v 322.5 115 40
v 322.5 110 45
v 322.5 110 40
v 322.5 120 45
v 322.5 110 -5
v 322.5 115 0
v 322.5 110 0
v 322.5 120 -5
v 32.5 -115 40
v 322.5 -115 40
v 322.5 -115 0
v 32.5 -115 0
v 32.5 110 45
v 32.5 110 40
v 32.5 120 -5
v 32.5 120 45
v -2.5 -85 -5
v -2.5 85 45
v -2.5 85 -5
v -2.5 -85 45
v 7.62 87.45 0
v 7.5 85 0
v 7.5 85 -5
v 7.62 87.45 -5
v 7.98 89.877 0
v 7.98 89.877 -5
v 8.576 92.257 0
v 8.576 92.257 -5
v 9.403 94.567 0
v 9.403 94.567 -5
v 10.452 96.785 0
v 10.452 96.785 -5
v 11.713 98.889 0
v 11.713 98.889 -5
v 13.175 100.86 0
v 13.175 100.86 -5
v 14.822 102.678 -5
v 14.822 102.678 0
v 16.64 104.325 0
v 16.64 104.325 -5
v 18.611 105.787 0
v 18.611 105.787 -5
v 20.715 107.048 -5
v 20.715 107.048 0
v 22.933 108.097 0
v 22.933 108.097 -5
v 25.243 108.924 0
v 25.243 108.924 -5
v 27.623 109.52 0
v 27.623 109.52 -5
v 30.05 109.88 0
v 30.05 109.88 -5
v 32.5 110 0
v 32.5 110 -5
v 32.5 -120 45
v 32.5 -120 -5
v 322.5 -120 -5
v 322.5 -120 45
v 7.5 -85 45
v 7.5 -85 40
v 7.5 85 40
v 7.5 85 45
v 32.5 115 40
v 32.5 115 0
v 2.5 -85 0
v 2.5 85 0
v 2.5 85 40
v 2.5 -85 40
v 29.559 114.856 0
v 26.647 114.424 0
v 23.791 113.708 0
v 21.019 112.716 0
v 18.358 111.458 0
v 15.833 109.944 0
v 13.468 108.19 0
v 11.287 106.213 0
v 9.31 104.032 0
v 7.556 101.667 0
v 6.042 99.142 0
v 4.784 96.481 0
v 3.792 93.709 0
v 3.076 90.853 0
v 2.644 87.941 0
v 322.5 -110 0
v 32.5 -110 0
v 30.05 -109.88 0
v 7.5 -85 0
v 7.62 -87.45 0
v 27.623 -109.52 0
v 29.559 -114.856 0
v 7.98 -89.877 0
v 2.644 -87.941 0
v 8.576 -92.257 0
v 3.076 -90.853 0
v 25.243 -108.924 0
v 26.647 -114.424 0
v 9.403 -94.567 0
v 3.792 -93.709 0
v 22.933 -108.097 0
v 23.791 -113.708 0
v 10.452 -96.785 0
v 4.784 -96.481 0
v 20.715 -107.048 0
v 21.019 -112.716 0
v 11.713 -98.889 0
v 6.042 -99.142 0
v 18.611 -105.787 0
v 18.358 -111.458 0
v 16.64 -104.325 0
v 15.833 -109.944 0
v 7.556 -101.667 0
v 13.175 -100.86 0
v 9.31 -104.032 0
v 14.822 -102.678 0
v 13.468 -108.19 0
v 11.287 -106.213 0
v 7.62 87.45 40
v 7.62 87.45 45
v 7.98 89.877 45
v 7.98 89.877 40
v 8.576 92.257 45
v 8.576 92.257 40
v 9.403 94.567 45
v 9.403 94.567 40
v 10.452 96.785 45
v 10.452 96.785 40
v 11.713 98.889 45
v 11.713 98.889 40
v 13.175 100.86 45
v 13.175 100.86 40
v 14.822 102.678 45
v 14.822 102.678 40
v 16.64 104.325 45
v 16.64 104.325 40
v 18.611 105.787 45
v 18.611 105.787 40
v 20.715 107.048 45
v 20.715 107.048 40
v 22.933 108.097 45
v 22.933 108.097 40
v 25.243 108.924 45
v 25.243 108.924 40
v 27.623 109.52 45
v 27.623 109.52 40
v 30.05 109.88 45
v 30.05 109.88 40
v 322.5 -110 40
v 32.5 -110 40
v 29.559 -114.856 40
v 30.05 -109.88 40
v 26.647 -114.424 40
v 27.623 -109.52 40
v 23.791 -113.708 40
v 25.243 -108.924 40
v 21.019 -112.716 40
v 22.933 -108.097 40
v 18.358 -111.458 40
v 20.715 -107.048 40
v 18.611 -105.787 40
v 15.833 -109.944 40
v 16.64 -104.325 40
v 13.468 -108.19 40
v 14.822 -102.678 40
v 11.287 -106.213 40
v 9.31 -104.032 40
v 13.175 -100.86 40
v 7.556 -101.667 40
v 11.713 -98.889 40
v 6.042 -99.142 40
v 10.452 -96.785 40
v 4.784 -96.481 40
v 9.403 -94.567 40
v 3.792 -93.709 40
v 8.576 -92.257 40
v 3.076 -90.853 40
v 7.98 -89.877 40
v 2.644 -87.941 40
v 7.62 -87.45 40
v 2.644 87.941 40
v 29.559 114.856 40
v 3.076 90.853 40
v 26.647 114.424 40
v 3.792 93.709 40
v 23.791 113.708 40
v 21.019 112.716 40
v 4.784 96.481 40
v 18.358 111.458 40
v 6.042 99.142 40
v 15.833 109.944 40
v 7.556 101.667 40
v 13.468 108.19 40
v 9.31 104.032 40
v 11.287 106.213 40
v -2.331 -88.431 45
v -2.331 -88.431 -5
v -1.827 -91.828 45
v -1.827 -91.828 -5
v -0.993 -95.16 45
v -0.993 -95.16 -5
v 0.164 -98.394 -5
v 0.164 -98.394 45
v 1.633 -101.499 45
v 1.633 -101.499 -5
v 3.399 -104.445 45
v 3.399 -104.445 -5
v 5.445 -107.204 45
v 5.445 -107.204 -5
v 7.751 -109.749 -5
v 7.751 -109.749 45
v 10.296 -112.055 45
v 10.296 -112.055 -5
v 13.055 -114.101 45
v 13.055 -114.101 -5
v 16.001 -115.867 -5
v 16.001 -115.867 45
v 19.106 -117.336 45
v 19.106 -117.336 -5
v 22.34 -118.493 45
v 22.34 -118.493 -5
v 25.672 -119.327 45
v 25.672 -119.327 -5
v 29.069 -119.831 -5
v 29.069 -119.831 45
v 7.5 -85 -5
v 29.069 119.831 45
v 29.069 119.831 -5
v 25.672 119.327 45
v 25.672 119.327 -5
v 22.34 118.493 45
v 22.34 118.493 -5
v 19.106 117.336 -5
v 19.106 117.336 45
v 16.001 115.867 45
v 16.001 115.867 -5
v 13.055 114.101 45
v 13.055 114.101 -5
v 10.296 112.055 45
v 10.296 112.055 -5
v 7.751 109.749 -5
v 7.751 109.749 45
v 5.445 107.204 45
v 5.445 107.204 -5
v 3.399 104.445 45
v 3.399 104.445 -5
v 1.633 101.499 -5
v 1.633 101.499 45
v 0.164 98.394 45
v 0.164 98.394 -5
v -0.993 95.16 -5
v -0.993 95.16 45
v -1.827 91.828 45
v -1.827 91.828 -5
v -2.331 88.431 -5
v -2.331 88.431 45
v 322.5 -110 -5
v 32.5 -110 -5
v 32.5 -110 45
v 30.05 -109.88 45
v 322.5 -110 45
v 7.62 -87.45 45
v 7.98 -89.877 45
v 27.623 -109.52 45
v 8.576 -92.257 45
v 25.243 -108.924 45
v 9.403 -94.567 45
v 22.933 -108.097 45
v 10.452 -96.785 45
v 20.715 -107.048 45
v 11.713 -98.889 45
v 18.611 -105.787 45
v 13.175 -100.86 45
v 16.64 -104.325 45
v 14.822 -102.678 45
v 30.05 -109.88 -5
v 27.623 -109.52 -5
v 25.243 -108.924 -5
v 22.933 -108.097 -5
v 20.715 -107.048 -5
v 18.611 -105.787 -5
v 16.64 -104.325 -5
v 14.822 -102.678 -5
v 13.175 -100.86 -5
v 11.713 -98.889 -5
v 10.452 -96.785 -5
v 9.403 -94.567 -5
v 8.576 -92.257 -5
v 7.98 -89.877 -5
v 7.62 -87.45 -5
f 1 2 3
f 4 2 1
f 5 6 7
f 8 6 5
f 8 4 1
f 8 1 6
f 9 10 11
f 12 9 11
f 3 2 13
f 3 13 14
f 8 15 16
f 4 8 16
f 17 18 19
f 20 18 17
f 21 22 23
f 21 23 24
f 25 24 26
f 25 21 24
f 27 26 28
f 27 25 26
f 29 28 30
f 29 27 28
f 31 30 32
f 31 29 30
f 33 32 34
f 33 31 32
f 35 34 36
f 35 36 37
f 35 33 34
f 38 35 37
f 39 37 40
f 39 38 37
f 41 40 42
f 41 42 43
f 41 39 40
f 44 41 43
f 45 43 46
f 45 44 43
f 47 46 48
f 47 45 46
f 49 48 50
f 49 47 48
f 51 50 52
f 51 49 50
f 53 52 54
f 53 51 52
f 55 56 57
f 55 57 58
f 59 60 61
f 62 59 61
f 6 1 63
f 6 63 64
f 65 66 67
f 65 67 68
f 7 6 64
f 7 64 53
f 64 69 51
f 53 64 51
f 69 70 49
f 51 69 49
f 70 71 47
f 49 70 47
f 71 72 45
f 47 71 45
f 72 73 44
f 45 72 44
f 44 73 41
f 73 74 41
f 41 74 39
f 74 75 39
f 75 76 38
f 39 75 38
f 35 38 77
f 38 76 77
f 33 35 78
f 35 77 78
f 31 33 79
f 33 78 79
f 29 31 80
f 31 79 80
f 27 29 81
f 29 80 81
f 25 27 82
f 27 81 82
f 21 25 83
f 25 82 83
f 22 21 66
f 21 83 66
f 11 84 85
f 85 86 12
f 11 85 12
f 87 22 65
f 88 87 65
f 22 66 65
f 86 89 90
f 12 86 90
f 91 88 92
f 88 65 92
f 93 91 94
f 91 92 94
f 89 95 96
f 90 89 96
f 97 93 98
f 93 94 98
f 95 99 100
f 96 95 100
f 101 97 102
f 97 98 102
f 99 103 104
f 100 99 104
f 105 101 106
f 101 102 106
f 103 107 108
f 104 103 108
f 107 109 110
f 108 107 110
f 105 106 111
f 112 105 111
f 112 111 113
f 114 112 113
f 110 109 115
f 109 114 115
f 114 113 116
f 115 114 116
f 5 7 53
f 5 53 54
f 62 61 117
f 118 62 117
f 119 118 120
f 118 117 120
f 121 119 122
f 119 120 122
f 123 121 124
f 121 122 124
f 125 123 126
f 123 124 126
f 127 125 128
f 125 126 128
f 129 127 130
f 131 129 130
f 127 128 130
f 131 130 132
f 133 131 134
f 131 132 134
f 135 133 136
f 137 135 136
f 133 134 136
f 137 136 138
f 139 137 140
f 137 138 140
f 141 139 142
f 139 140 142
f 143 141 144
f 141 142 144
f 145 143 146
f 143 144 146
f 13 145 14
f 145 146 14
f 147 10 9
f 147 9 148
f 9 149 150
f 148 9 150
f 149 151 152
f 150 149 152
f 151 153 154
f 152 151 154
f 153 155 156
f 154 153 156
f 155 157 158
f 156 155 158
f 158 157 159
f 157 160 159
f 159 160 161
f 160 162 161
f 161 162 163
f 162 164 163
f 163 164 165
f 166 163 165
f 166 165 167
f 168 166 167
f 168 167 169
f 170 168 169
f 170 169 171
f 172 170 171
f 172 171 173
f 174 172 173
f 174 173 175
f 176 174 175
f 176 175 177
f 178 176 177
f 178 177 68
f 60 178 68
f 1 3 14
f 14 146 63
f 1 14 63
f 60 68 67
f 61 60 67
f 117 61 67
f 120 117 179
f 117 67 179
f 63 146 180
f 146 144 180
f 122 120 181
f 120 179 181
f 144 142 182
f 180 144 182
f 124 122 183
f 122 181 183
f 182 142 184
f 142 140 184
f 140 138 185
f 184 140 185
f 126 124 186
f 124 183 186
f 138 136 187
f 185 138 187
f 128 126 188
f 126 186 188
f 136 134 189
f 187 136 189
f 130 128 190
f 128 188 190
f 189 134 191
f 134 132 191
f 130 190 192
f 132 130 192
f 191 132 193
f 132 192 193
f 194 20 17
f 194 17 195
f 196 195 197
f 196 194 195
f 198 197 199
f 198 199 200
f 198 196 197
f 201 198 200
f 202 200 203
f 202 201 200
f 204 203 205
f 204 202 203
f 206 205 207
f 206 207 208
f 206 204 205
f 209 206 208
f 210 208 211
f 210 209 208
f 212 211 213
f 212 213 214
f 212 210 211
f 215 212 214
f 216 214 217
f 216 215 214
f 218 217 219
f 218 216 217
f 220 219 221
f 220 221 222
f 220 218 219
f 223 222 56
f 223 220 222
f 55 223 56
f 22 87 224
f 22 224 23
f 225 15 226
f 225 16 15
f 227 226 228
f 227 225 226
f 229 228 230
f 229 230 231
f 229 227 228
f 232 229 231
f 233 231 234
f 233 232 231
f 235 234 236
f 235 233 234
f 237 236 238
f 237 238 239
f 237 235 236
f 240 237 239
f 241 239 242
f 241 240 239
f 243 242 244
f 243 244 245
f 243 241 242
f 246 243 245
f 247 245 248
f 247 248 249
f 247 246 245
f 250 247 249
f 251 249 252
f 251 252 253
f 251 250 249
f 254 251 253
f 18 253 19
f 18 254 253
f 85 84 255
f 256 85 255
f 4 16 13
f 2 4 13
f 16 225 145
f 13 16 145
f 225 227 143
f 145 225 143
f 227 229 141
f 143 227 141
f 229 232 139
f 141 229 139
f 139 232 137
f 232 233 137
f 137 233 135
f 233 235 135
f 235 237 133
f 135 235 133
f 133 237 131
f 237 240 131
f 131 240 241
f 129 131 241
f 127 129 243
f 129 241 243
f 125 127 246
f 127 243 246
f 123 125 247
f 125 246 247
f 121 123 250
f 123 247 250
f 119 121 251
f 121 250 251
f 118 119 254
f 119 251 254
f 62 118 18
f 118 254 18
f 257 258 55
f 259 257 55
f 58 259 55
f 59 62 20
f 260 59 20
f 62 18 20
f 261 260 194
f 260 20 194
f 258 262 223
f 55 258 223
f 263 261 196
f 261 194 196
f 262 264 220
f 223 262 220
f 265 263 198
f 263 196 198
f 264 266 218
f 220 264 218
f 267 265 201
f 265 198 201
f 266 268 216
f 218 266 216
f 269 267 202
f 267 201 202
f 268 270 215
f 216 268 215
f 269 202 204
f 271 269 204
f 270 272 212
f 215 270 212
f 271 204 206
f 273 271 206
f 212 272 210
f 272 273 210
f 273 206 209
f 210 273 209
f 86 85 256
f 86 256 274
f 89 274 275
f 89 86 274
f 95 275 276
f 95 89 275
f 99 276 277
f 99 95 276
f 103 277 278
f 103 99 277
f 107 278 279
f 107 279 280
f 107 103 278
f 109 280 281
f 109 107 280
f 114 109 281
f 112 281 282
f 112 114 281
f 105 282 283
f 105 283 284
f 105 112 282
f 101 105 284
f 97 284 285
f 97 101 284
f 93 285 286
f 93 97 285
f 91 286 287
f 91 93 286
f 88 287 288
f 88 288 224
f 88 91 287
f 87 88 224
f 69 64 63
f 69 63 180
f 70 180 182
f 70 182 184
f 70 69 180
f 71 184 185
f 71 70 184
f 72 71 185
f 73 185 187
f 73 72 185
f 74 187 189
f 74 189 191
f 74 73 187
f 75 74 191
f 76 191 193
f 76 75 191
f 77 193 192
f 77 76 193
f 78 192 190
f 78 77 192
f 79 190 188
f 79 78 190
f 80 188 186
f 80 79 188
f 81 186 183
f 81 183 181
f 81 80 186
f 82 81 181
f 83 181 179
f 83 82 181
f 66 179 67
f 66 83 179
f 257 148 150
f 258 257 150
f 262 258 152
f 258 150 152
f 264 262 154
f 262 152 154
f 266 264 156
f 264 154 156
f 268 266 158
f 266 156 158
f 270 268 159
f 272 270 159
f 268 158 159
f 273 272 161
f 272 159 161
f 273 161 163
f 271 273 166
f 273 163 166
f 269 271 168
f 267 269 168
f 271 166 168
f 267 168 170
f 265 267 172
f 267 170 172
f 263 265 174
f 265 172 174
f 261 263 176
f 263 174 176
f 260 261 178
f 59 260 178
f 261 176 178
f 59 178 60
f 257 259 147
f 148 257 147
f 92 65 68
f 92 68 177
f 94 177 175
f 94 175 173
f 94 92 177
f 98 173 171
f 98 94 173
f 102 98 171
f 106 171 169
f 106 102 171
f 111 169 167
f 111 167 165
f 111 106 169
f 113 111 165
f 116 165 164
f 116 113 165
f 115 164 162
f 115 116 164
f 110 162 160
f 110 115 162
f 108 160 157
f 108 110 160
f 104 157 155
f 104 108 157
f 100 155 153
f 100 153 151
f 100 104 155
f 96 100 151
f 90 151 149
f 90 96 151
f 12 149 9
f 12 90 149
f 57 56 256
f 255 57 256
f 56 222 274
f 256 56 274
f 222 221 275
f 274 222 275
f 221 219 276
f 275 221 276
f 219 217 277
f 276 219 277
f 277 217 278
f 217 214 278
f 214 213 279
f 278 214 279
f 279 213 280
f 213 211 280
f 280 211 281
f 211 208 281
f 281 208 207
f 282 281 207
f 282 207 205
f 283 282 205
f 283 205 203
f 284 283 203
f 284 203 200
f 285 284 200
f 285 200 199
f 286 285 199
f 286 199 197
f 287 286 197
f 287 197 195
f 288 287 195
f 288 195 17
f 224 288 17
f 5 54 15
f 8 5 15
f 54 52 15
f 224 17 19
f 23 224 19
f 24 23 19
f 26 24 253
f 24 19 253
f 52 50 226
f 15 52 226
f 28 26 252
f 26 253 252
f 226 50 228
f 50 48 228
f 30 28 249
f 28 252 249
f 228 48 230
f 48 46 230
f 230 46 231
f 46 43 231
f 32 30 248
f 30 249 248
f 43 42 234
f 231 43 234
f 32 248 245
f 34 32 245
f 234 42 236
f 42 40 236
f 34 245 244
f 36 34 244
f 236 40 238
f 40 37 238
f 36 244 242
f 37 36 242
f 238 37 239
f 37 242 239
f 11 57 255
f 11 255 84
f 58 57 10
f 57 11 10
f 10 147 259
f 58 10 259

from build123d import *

# Parameters (mm, degrees)
SALIENTE_EXTRUIR1_DEPTH = 40
SALIENTE_EXTRUIR2_DEPTH = 5
SALIENTE_EXTRUIR3_DEPTH = 290


with BuildPart() as part:
    # Croquis1 → Saliente-Extruir1 (new body)
    with BuildSketch(Plane.XY):
        with BuildLine():
            Line((-2.5, -85), (-2.5, 85))
            ThreePointArc((-2.5, 85), (7.751262658, 109.748737342), (32.5, 120))
            Line((32.5, 120), (32.5, 115))
            ThreePointArc((32.5, 115), (11.286796564, 106.213203436), (2.5, 85))
            Line((2.5, 85), (2.5, -85))
            ThreePointArc((2.5, -85), (11.286796564, -106.213203436), (32.5, -115))
            Line((32.5, -115), (32.5, -120))
            ThreePointArc((32.5, -120), (7.751262658, -109.748737342), (-2.5, -85))
        make_face()
    extrude(amount=SALIENTE_EXTRUIR1_DEPTH)

    # Croquis2 → Saliente-Extruir2 (add)
    with BuildSketch(Plane.XY.offset(40)):
        with BuildLine():
            Line((-2.5, 85), (-2.5, -85))
            ThreePointArc((-2.5, -85), (7.751262658, -109.748737342), (32.5, -120))
            Line((32.5, -120), (32.5, -110))
            ThreePointArc((32.5, -110), (14.82233047, -102.67766953), (7.5, -85))
            Line((7.5, -85), (7.5, 85))
            ThreePointArc((7.5, 85), (14.82233047, 102.67766953), (32.5, 110))
            Line((32.5, 110), (32.5, 120))
            ThreePointArc((32.5, 120), (7.751262658, 109.748737342), (-2.5, 85))
        make_face()
    saliente_extruir2 = extrude(amount=SALIENTE_EXTRUIR2_DEPTH)

    # Simetría1: Saliente-Extruir2 across plane
    add(saliente_extruir2.mirror(Plane.XY.offset(20)))

    # Croquis3 → Saliente-Extruir3 (add)
    with BuildSketch(Plane(origin=(32.5, 0, 0), x_dir=(0, 0, -1), z_dir=(1, 0, 0))):
        Polygon((-45, 120), (-45, 110), (-40, 110), (-40, 115), (0, 115), (0, 110), (5, 110), (5, 120), align=None)
        Polygon((-45, -110), (-40, -110), (-40, -115), (0, -115), (0, -110), (5, -110), (5, -120), (-45, -120), align=None)
    extrude(amount=SALIENTE_EXTRUIR3_DEPTH)


solid = part.part
